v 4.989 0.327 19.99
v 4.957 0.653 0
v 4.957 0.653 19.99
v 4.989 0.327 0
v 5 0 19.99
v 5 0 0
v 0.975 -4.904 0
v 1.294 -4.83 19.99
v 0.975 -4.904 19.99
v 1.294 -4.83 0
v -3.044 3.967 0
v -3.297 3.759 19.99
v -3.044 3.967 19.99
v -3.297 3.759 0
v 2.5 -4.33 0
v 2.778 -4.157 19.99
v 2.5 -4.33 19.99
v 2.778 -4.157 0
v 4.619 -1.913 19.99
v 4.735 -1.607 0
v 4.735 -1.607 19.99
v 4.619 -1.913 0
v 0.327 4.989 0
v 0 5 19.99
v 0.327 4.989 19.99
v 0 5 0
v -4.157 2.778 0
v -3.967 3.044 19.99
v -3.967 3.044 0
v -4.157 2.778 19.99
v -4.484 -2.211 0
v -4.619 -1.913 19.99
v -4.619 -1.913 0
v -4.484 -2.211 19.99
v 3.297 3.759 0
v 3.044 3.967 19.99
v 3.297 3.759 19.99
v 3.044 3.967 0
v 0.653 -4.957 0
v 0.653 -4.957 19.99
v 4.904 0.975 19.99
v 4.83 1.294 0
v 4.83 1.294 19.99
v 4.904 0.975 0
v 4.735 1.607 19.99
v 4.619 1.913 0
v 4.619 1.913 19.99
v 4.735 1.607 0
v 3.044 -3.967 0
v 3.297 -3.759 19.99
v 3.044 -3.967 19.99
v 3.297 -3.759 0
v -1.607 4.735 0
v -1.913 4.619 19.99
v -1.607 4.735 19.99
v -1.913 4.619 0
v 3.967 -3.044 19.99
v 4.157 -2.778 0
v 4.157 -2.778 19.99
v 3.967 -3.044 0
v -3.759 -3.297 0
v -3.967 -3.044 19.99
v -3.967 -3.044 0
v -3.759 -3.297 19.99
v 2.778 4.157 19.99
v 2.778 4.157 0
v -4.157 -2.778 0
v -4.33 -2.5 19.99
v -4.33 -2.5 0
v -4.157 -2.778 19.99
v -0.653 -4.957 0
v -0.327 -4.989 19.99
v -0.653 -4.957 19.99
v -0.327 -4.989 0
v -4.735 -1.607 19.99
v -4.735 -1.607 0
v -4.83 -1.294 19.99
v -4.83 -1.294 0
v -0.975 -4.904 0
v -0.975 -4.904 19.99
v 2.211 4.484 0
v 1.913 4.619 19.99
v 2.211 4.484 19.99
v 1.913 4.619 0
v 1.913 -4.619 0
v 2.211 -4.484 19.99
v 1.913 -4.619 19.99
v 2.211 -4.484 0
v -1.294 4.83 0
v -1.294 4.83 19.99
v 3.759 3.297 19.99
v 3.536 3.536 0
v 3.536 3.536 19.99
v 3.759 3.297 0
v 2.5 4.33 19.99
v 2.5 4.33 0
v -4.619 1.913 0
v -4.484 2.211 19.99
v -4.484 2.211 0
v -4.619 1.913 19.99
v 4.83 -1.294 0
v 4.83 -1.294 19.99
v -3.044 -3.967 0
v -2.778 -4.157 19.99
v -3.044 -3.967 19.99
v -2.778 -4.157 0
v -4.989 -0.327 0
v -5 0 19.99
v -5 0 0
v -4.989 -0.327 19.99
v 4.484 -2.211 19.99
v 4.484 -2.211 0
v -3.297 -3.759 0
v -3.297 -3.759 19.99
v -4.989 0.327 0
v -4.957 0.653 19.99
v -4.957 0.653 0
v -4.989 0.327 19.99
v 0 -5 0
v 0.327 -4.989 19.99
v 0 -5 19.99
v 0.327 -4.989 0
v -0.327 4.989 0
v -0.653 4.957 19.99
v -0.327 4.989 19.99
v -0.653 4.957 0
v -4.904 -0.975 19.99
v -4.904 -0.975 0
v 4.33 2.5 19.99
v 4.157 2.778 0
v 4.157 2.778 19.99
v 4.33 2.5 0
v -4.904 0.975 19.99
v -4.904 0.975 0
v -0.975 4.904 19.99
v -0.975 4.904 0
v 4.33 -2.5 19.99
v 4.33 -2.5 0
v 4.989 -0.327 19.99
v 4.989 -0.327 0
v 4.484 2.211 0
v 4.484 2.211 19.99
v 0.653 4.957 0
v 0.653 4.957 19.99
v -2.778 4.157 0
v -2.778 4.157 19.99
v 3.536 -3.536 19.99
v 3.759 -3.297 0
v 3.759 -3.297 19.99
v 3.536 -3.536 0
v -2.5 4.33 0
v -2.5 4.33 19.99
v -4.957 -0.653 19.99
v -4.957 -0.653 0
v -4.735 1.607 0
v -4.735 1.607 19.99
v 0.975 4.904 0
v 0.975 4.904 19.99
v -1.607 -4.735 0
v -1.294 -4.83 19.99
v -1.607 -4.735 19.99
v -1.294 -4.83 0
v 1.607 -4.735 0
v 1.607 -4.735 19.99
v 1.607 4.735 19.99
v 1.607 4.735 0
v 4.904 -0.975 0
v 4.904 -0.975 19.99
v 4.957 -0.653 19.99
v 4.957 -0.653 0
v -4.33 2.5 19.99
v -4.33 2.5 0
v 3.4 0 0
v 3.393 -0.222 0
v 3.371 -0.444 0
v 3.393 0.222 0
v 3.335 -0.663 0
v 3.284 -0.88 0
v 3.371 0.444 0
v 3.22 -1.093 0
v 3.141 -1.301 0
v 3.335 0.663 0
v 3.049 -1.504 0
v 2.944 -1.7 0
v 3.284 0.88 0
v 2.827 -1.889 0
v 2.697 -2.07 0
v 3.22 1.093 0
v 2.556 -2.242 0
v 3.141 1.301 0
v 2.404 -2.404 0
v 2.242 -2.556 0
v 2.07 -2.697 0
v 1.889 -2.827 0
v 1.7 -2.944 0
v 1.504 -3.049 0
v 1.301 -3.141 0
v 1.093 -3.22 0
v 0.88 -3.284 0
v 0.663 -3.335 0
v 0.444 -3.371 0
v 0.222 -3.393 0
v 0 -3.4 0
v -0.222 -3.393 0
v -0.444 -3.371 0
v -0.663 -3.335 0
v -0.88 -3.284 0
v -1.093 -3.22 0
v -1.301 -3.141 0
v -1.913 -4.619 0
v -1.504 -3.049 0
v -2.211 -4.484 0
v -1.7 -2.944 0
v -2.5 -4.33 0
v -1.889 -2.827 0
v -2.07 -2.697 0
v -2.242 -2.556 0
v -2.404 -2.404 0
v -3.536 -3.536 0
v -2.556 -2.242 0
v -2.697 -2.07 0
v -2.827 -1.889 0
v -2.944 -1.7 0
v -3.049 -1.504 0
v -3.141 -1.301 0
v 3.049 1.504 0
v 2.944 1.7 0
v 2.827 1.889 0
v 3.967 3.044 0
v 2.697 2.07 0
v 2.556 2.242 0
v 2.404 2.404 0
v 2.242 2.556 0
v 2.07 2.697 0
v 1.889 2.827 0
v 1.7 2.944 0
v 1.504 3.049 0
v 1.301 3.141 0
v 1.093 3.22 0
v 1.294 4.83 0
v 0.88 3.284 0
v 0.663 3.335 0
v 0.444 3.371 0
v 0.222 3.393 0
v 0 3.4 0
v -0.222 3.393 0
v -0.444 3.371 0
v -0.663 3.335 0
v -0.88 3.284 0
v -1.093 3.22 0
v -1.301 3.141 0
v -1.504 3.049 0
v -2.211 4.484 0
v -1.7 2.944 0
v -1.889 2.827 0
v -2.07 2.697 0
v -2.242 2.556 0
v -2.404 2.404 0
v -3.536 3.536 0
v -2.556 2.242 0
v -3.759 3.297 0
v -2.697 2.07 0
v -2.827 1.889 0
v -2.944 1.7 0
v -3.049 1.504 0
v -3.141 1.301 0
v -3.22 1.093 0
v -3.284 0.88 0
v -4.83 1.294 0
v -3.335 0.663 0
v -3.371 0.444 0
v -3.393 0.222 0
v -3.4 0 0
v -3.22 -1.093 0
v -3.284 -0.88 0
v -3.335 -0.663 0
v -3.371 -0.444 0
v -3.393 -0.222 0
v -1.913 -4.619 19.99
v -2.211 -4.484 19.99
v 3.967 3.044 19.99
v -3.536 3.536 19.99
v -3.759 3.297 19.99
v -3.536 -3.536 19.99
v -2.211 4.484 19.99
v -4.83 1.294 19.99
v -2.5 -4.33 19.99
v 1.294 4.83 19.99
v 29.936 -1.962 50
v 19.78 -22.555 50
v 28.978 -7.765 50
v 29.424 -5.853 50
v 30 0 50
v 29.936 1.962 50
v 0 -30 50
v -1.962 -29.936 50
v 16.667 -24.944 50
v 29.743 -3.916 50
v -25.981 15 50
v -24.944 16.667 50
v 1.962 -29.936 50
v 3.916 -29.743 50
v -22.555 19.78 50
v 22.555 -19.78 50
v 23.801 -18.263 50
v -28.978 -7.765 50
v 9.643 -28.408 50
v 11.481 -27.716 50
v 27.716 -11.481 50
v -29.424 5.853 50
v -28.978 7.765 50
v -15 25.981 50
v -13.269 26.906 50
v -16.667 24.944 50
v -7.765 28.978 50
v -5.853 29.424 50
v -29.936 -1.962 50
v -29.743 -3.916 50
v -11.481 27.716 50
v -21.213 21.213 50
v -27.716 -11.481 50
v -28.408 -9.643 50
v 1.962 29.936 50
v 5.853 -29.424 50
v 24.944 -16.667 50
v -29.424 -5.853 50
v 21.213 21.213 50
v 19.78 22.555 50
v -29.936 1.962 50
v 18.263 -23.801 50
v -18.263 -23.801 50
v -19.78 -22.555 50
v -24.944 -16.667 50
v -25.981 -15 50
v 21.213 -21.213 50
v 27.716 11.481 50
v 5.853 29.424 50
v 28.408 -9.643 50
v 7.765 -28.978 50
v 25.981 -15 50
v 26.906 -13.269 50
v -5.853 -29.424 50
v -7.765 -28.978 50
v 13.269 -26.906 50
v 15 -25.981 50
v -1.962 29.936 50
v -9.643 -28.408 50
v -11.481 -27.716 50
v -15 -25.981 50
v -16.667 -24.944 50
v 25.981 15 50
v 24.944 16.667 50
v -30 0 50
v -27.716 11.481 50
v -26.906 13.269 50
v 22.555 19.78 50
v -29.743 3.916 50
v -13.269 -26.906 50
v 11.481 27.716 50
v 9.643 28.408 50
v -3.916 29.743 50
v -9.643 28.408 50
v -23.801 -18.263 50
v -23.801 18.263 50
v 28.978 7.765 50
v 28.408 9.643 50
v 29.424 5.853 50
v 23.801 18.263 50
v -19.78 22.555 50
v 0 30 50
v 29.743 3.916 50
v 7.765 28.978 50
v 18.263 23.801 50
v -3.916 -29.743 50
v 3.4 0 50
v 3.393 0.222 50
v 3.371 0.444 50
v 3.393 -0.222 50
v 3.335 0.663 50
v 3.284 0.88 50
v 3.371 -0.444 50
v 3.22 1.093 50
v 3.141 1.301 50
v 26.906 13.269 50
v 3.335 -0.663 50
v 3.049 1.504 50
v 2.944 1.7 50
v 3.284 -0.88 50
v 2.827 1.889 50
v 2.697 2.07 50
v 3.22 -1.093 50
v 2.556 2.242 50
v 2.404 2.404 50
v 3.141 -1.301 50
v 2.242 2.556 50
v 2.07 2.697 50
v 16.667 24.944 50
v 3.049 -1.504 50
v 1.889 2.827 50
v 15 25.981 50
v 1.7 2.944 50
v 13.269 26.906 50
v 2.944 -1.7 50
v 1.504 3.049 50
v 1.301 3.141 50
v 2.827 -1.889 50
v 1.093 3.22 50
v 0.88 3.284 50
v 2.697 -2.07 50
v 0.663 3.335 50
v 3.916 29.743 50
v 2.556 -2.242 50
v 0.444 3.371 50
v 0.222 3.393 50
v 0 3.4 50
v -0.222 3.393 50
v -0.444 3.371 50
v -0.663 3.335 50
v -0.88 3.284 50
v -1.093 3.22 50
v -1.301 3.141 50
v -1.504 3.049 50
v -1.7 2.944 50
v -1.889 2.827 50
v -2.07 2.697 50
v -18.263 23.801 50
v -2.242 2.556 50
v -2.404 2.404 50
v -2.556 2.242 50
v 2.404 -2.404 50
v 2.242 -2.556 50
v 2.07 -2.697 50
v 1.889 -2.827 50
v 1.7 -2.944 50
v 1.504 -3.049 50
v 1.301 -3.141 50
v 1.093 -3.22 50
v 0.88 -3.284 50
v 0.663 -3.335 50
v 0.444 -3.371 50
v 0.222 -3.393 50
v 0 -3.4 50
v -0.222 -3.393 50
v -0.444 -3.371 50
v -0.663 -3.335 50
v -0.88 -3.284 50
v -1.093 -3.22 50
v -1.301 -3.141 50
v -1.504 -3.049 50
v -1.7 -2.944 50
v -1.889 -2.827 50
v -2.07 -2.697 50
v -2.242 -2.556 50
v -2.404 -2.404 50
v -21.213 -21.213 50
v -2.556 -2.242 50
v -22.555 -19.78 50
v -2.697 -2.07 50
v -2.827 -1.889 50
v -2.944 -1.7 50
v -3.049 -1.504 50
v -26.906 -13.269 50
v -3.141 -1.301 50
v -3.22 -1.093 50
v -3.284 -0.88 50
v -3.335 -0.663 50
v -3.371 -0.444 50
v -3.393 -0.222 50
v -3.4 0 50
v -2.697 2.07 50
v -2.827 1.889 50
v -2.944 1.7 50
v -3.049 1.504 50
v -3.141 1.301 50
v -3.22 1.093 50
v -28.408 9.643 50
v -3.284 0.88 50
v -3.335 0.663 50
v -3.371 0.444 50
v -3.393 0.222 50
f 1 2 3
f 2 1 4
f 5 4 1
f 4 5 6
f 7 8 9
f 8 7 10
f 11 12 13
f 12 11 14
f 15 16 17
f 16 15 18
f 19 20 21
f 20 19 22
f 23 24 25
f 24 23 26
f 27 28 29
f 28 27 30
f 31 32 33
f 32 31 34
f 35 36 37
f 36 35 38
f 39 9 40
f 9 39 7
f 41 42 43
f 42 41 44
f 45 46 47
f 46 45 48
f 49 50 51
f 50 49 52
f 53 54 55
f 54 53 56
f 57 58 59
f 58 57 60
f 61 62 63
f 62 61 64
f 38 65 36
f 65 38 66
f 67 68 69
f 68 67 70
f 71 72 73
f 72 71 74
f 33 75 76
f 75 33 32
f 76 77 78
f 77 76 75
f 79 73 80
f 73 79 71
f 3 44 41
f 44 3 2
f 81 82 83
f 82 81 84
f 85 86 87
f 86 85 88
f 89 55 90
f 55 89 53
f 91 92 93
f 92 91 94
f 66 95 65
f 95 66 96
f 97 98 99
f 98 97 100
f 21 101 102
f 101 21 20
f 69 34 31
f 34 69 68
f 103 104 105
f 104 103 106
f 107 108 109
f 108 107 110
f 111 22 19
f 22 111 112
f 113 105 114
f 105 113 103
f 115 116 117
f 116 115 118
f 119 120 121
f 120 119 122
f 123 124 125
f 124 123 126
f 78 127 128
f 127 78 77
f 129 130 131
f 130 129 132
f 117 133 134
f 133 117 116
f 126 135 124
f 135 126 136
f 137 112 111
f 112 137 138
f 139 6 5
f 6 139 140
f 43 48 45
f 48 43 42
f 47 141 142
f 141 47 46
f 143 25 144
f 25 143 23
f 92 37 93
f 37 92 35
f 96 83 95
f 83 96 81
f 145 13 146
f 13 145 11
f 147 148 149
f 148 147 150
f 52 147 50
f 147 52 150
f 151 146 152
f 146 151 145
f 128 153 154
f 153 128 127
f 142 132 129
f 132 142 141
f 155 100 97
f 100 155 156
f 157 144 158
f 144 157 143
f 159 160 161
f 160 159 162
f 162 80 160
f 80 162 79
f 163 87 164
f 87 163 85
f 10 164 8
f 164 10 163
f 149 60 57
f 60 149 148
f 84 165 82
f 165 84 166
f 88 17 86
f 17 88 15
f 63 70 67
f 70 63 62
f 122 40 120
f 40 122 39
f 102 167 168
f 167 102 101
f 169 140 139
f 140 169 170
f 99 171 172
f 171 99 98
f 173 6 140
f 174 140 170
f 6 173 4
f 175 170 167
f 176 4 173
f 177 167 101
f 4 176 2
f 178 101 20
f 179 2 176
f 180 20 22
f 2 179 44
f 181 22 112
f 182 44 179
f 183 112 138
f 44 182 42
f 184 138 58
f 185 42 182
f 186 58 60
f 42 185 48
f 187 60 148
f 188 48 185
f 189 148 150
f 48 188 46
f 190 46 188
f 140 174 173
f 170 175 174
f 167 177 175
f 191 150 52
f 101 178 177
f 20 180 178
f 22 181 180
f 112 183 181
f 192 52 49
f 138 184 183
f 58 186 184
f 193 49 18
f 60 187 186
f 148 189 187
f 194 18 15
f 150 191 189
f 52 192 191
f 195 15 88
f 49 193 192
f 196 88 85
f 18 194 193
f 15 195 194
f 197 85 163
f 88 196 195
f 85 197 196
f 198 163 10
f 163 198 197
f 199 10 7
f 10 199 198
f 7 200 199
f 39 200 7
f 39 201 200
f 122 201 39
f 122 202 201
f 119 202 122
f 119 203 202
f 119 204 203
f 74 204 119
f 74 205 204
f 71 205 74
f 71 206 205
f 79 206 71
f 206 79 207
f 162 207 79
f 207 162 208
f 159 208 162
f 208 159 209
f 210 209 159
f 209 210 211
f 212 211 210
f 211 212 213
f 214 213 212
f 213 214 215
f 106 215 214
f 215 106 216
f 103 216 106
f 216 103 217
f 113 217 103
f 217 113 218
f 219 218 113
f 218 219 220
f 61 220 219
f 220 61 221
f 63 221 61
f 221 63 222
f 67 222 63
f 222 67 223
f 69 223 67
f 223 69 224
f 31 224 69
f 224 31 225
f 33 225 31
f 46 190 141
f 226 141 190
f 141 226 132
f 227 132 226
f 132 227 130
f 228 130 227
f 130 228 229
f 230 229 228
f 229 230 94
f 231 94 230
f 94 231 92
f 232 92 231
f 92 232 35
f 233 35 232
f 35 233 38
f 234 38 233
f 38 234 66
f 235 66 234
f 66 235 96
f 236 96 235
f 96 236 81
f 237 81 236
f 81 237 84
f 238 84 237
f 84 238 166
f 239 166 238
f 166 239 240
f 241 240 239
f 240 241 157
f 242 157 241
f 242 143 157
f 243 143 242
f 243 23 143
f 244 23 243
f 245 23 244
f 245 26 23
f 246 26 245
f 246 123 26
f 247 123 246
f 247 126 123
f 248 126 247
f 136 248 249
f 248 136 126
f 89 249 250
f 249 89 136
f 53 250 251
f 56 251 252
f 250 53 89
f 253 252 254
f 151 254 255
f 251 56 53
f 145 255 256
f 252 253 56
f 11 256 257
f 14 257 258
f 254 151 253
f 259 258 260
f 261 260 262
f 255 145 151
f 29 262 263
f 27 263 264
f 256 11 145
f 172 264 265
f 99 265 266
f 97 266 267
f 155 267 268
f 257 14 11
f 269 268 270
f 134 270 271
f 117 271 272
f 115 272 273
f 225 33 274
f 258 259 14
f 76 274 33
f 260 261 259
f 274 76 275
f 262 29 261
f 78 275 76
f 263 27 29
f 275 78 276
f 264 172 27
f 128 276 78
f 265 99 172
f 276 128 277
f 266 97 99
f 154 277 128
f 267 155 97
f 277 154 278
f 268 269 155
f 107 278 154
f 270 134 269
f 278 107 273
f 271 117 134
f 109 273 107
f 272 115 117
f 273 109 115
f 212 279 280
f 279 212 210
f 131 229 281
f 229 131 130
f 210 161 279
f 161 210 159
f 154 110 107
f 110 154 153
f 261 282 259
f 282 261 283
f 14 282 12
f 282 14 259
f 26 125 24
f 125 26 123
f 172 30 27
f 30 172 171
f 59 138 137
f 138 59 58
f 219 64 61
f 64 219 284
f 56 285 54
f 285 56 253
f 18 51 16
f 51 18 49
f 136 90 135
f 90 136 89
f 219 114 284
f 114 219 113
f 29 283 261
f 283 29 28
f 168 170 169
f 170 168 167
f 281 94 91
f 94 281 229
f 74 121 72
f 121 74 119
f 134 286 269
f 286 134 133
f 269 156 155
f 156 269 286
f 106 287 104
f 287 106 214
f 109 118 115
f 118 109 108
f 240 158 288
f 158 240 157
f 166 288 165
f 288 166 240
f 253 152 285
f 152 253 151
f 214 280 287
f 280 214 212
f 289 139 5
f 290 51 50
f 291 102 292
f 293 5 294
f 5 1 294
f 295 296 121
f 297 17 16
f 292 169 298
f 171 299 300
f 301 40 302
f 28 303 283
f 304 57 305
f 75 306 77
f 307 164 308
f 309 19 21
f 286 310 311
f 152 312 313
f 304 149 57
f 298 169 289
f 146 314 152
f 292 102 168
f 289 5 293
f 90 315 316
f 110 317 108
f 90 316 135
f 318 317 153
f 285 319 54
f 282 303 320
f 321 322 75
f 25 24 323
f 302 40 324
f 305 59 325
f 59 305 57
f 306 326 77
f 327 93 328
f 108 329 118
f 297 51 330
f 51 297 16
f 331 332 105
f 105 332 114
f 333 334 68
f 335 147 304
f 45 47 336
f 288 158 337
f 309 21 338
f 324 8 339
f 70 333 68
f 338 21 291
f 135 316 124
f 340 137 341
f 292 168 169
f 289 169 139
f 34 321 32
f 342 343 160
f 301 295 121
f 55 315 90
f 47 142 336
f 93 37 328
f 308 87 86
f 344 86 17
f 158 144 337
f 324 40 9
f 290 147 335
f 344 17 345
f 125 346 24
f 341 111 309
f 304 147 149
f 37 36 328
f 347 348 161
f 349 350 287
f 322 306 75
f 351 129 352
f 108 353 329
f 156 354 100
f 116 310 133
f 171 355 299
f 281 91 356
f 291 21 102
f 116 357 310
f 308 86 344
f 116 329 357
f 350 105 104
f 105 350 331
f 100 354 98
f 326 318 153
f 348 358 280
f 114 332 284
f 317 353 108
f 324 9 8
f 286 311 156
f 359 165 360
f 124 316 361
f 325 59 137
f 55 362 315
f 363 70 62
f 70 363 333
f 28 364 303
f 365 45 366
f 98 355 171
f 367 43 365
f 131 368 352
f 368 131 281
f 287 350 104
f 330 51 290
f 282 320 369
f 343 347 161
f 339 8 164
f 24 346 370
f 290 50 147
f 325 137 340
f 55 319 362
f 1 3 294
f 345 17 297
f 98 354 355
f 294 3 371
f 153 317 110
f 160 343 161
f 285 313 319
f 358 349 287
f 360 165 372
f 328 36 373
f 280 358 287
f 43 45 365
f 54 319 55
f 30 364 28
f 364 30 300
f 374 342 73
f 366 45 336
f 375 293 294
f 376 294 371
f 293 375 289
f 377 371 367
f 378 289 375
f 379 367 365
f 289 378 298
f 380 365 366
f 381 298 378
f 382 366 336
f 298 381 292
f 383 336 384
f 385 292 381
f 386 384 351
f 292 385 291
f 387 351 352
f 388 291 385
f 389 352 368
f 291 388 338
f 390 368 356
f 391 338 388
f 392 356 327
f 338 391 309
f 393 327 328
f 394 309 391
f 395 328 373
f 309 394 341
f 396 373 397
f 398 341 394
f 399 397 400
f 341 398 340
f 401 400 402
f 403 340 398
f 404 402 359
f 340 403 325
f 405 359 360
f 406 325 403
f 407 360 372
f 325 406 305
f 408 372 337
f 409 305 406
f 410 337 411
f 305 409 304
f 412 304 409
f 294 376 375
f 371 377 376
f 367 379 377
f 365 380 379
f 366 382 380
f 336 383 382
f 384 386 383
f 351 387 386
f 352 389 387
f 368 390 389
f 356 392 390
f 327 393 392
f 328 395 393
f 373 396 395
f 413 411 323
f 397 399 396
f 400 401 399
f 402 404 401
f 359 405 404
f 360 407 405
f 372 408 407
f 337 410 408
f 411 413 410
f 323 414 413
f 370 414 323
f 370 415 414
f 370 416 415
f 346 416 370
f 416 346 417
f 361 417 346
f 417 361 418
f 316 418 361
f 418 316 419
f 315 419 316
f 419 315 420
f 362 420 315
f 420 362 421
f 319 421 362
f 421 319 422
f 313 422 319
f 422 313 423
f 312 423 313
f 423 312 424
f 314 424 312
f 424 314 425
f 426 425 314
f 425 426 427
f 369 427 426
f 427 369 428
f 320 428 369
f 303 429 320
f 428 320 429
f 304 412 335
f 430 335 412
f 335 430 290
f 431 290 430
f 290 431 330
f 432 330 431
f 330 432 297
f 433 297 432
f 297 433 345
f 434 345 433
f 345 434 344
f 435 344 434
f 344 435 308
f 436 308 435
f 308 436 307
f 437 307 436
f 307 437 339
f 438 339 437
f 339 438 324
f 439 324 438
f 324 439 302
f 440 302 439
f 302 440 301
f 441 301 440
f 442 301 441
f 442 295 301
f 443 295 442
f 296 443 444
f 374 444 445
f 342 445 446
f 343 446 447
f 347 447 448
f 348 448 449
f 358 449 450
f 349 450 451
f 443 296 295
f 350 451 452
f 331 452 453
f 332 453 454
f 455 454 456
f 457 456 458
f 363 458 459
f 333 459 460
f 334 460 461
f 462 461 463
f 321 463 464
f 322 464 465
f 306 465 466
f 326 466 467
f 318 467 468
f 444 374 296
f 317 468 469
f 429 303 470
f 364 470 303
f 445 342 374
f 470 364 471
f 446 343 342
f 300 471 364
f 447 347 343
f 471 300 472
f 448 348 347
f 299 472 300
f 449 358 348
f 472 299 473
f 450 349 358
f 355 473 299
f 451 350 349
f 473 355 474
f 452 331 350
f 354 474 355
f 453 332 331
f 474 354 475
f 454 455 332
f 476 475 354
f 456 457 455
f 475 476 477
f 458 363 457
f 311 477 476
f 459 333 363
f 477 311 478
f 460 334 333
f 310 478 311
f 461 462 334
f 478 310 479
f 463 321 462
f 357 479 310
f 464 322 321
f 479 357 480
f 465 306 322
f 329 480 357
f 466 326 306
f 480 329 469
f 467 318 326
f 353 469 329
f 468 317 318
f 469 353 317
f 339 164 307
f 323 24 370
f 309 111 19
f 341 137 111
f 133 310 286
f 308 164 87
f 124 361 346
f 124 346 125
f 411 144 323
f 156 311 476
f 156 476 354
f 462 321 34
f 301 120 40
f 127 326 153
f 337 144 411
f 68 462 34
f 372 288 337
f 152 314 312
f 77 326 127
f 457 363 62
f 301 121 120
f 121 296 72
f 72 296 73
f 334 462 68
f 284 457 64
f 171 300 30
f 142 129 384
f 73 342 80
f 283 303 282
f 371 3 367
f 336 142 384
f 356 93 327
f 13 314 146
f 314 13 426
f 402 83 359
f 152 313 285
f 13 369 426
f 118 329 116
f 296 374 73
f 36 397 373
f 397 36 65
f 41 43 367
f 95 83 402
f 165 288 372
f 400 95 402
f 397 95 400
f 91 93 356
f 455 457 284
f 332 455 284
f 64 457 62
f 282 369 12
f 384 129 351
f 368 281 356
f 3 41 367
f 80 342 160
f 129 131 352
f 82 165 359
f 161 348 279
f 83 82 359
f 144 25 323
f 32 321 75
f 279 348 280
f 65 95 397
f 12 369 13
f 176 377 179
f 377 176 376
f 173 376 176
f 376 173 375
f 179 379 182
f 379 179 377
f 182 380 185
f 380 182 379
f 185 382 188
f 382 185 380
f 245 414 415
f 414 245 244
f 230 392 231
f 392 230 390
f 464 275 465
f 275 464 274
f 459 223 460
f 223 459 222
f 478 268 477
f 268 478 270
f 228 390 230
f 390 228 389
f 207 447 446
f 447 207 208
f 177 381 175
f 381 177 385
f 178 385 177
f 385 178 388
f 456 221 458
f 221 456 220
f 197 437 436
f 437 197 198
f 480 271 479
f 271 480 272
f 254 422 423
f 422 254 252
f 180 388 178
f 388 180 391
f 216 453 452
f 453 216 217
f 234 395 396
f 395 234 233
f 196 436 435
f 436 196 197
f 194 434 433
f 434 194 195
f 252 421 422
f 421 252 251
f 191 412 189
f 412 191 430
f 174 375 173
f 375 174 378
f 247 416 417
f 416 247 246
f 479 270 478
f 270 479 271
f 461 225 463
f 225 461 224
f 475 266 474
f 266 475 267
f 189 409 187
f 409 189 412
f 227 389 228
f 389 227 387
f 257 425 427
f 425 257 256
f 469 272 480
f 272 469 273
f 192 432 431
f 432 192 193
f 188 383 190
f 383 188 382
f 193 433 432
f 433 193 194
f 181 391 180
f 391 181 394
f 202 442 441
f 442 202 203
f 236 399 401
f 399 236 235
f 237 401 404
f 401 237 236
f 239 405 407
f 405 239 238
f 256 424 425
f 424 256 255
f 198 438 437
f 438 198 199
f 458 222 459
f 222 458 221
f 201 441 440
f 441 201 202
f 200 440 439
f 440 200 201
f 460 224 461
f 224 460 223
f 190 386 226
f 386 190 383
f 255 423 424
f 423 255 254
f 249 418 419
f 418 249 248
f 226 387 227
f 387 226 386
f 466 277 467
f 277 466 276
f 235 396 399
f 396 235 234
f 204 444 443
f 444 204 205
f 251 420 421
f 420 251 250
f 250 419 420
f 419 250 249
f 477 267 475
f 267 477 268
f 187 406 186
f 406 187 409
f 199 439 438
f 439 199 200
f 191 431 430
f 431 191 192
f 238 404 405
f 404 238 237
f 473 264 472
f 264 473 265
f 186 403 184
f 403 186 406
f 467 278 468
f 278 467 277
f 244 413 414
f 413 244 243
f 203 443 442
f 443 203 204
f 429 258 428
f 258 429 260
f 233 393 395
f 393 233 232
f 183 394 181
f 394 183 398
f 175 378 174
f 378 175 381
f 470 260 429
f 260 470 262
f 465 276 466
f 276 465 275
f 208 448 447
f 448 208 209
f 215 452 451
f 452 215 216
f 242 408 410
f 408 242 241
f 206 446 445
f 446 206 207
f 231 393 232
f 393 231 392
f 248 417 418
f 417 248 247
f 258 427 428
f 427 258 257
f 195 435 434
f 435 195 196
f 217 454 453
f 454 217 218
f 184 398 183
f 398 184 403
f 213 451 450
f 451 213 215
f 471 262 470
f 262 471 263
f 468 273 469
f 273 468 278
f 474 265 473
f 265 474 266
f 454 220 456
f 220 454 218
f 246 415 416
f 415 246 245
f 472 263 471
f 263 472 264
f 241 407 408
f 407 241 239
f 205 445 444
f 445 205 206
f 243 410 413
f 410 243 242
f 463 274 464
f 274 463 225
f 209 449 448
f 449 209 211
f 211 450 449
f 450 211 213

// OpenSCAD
// Small lab funnel, printed upright (wide opening at top)
// All dimensions in mm

// ---- Parameters ----
spout_od      = 10;    // spout outer diameter
spout_h       = 20;    // spout height (z = 0 to 20)
cone_od_bottom = 10;    // cone outer diameter at z = 20
cone_od_top   = 60;    // cone outer diameter at rim (z = 50)
rim_h         = 30;    // cone height (z = 20 to 50)
wall          = 1.6;   // wall thickness everywhere
eps           = 0.5;   // cutter overshoot past faces

$fn = 96;

// ---- Derived ----
spout_id = spout_od - 2 * wall;   // 6.8 mm bore

// ---- Model ----
difference() {
    union() {
        // Spout
        cylinder(d = spout_od, h = spout_h);
        // Cone (slightly overlapping spout for a clean union)
        translate([0, 0, spout_h - 0.01])
            cylinder(d1 = cone_od_bottom, d2 = cone_od_top, h = rim_h + 0.01);
    }
    // Hollow out the full height so liquid runs straight through
    translate([0, 0, -eps])
        cylinder(d = spout_id, h = spout_h + rim_h + 2 * eps);
}
